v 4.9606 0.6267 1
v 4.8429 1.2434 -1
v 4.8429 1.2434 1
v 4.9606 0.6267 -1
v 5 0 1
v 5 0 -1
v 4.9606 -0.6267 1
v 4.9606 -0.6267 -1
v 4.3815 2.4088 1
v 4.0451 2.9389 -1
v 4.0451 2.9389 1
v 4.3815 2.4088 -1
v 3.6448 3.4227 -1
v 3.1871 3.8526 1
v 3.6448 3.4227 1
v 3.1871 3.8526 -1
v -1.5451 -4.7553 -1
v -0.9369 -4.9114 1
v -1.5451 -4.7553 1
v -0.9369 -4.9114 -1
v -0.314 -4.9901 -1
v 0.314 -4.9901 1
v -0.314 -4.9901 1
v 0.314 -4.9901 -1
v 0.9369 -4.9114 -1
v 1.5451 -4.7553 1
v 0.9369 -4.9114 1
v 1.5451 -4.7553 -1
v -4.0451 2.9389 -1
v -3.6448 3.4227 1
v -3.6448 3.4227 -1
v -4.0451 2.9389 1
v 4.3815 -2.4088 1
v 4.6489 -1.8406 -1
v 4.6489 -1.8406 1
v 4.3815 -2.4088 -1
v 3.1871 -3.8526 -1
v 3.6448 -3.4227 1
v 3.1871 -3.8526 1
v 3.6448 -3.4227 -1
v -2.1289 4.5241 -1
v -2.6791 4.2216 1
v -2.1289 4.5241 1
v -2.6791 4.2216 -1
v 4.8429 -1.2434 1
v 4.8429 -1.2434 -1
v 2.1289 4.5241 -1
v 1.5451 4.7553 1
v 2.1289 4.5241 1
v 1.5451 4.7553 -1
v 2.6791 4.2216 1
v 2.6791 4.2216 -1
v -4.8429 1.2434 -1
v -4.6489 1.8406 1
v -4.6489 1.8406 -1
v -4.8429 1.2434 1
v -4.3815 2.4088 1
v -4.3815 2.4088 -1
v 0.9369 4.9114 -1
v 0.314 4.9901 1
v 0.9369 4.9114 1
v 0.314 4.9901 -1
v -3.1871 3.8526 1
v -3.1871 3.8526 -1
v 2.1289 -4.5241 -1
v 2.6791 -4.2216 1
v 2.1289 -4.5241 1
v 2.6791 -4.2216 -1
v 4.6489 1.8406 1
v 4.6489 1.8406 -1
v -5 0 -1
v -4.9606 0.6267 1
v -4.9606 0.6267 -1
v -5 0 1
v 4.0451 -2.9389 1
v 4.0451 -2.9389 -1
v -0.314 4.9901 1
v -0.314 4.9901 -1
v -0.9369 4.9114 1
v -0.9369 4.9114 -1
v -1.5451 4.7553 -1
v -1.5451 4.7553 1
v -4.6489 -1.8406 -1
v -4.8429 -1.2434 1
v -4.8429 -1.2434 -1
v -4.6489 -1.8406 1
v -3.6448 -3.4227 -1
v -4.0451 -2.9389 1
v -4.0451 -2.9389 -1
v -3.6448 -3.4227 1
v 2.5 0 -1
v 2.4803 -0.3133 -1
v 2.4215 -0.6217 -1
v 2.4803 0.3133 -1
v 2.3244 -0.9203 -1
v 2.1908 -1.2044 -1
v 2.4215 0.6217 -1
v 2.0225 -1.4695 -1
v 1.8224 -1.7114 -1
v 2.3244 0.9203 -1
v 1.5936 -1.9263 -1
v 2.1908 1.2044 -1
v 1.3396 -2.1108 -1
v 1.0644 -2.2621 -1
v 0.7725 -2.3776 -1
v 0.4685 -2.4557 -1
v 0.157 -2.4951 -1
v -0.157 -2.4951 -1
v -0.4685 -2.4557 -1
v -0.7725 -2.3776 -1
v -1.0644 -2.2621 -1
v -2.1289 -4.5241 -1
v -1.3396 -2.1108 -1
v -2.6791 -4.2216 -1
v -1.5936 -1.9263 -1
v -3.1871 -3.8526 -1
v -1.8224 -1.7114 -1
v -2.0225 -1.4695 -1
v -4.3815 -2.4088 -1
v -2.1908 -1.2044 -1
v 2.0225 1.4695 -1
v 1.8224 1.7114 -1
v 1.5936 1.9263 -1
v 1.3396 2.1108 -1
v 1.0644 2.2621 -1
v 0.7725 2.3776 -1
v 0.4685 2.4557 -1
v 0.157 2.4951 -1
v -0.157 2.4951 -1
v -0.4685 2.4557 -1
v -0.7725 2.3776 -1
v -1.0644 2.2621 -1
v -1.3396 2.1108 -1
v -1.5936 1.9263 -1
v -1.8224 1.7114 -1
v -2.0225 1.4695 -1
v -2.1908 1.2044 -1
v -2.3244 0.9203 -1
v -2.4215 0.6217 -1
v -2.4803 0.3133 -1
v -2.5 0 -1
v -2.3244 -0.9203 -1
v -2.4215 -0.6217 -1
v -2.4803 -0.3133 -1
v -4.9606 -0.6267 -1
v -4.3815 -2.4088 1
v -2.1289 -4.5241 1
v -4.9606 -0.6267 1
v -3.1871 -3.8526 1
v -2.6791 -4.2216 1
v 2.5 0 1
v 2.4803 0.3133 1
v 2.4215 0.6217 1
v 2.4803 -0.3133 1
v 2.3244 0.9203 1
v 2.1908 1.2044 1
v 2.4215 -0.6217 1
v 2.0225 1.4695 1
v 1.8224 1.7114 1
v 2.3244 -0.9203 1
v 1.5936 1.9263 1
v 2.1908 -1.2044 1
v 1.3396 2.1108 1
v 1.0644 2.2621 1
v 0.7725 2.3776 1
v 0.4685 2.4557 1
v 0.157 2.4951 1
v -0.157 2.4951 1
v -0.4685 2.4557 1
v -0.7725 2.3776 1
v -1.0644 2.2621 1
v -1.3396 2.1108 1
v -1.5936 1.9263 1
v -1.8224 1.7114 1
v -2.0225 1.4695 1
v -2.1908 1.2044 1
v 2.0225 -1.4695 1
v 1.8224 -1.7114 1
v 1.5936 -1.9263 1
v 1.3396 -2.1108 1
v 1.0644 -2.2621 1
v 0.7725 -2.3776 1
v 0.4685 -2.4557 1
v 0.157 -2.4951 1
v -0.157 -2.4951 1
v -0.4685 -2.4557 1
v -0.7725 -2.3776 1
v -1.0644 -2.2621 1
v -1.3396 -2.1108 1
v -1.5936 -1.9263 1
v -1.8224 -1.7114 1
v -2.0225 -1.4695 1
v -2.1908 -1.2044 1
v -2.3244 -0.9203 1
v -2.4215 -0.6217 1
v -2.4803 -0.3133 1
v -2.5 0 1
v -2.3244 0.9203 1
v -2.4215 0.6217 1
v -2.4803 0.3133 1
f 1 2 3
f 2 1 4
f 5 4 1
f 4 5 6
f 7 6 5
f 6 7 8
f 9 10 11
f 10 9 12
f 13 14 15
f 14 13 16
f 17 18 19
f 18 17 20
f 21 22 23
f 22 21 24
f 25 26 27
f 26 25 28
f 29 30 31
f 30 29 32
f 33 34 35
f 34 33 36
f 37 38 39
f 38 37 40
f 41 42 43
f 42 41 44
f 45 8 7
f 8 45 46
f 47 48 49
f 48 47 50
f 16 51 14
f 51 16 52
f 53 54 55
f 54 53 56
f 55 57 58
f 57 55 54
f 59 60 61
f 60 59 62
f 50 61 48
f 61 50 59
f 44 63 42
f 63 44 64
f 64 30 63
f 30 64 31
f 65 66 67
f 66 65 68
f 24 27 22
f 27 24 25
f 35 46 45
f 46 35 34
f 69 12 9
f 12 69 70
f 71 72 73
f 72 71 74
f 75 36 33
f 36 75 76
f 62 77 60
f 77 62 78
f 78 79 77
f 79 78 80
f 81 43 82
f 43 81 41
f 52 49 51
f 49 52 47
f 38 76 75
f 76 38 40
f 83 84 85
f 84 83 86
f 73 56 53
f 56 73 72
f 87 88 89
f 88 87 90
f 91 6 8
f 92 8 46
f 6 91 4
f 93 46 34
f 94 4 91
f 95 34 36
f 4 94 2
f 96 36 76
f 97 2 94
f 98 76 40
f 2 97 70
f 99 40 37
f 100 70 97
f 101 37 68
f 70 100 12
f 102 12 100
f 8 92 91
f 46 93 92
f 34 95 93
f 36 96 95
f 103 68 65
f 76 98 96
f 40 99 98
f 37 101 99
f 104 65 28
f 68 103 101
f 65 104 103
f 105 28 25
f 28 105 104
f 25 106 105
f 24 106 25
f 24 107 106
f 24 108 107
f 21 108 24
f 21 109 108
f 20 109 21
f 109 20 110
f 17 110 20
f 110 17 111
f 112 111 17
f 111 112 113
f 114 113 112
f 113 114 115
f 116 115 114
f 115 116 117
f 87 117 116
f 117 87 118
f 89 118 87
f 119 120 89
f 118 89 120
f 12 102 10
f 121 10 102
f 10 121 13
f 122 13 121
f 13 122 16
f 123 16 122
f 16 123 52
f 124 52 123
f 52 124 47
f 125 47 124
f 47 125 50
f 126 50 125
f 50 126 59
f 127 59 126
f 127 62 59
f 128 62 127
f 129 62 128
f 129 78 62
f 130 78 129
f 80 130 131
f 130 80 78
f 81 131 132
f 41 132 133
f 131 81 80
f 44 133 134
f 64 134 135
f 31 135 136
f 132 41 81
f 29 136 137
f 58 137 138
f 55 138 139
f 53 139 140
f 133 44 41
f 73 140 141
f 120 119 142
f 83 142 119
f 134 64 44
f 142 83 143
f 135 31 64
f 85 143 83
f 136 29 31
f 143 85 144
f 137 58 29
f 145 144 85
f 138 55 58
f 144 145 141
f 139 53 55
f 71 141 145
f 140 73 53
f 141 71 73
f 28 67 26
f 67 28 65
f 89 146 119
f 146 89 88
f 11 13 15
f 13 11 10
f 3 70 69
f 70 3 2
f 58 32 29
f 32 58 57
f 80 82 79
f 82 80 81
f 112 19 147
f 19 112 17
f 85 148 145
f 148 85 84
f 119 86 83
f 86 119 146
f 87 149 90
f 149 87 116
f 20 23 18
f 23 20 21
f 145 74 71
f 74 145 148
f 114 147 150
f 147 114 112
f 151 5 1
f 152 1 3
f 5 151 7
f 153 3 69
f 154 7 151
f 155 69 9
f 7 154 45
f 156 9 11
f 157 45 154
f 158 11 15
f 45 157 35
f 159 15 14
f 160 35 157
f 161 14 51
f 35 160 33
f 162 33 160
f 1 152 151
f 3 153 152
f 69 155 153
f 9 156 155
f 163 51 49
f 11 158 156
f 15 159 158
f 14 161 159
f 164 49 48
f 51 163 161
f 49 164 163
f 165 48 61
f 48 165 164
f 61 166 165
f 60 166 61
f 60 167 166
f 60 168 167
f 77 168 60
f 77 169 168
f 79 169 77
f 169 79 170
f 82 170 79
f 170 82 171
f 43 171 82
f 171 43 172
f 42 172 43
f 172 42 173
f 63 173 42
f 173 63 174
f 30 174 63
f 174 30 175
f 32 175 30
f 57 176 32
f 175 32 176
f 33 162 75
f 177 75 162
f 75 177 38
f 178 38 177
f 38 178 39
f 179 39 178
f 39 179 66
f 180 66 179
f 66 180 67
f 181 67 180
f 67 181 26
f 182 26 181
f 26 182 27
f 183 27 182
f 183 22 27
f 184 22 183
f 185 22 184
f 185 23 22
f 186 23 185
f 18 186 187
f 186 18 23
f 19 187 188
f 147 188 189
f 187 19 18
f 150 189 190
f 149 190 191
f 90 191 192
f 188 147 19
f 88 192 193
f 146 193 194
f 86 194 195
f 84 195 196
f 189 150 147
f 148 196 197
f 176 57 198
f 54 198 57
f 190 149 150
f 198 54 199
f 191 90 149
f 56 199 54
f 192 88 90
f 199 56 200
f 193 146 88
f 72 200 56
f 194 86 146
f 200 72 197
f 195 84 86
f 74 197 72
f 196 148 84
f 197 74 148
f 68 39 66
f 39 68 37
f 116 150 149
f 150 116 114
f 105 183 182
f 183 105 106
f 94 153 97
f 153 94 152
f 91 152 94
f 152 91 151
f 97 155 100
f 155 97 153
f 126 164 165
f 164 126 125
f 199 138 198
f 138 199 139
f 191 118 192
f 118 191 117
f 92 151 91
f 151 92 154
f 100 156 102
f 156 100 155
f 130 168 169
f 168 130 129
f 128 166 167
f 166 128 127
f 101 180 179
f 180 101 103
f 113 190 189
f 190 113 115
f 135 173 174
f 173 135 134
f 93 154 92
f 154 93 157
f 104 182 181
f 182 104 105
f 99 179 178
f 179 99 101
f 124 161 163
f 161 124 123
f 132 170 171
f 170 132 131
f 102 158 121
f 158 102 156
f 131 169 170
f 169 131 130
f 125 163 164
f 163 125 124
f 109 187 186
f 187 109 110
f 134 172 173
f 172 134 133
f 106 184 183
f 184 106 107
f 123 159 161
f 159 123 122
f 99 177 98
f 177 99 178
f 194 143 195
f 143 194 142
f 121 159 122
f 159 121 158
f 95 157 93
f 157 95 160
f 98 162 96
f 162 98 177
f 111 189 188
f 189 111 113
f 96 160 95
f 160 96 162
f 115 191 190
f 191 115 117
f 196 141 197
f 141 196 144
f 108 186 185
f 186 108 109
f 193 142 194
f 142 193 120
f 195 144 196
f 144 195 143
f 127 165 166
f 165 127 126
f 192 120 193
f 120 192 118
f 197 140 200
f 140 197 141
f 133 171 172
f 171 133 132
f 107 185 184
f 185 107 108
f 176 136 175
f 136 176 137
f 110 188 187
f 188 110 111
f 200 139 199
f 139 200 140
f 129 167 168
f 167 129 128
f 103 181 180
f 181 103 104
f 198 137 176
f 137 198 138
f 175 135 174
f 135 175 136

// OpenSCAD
$fn = 50;


difference() {
	union() {
		translate(v = [0, 0, -1.0000000000]) {
			cylinder(h = 2, r = 5.0000000000);
		}
	}
	union() {
		translate(v = [0, 0, -100.0000000000]) {
			cylinder(h = 200, r = 2.5000000000);
		}
	}
}
